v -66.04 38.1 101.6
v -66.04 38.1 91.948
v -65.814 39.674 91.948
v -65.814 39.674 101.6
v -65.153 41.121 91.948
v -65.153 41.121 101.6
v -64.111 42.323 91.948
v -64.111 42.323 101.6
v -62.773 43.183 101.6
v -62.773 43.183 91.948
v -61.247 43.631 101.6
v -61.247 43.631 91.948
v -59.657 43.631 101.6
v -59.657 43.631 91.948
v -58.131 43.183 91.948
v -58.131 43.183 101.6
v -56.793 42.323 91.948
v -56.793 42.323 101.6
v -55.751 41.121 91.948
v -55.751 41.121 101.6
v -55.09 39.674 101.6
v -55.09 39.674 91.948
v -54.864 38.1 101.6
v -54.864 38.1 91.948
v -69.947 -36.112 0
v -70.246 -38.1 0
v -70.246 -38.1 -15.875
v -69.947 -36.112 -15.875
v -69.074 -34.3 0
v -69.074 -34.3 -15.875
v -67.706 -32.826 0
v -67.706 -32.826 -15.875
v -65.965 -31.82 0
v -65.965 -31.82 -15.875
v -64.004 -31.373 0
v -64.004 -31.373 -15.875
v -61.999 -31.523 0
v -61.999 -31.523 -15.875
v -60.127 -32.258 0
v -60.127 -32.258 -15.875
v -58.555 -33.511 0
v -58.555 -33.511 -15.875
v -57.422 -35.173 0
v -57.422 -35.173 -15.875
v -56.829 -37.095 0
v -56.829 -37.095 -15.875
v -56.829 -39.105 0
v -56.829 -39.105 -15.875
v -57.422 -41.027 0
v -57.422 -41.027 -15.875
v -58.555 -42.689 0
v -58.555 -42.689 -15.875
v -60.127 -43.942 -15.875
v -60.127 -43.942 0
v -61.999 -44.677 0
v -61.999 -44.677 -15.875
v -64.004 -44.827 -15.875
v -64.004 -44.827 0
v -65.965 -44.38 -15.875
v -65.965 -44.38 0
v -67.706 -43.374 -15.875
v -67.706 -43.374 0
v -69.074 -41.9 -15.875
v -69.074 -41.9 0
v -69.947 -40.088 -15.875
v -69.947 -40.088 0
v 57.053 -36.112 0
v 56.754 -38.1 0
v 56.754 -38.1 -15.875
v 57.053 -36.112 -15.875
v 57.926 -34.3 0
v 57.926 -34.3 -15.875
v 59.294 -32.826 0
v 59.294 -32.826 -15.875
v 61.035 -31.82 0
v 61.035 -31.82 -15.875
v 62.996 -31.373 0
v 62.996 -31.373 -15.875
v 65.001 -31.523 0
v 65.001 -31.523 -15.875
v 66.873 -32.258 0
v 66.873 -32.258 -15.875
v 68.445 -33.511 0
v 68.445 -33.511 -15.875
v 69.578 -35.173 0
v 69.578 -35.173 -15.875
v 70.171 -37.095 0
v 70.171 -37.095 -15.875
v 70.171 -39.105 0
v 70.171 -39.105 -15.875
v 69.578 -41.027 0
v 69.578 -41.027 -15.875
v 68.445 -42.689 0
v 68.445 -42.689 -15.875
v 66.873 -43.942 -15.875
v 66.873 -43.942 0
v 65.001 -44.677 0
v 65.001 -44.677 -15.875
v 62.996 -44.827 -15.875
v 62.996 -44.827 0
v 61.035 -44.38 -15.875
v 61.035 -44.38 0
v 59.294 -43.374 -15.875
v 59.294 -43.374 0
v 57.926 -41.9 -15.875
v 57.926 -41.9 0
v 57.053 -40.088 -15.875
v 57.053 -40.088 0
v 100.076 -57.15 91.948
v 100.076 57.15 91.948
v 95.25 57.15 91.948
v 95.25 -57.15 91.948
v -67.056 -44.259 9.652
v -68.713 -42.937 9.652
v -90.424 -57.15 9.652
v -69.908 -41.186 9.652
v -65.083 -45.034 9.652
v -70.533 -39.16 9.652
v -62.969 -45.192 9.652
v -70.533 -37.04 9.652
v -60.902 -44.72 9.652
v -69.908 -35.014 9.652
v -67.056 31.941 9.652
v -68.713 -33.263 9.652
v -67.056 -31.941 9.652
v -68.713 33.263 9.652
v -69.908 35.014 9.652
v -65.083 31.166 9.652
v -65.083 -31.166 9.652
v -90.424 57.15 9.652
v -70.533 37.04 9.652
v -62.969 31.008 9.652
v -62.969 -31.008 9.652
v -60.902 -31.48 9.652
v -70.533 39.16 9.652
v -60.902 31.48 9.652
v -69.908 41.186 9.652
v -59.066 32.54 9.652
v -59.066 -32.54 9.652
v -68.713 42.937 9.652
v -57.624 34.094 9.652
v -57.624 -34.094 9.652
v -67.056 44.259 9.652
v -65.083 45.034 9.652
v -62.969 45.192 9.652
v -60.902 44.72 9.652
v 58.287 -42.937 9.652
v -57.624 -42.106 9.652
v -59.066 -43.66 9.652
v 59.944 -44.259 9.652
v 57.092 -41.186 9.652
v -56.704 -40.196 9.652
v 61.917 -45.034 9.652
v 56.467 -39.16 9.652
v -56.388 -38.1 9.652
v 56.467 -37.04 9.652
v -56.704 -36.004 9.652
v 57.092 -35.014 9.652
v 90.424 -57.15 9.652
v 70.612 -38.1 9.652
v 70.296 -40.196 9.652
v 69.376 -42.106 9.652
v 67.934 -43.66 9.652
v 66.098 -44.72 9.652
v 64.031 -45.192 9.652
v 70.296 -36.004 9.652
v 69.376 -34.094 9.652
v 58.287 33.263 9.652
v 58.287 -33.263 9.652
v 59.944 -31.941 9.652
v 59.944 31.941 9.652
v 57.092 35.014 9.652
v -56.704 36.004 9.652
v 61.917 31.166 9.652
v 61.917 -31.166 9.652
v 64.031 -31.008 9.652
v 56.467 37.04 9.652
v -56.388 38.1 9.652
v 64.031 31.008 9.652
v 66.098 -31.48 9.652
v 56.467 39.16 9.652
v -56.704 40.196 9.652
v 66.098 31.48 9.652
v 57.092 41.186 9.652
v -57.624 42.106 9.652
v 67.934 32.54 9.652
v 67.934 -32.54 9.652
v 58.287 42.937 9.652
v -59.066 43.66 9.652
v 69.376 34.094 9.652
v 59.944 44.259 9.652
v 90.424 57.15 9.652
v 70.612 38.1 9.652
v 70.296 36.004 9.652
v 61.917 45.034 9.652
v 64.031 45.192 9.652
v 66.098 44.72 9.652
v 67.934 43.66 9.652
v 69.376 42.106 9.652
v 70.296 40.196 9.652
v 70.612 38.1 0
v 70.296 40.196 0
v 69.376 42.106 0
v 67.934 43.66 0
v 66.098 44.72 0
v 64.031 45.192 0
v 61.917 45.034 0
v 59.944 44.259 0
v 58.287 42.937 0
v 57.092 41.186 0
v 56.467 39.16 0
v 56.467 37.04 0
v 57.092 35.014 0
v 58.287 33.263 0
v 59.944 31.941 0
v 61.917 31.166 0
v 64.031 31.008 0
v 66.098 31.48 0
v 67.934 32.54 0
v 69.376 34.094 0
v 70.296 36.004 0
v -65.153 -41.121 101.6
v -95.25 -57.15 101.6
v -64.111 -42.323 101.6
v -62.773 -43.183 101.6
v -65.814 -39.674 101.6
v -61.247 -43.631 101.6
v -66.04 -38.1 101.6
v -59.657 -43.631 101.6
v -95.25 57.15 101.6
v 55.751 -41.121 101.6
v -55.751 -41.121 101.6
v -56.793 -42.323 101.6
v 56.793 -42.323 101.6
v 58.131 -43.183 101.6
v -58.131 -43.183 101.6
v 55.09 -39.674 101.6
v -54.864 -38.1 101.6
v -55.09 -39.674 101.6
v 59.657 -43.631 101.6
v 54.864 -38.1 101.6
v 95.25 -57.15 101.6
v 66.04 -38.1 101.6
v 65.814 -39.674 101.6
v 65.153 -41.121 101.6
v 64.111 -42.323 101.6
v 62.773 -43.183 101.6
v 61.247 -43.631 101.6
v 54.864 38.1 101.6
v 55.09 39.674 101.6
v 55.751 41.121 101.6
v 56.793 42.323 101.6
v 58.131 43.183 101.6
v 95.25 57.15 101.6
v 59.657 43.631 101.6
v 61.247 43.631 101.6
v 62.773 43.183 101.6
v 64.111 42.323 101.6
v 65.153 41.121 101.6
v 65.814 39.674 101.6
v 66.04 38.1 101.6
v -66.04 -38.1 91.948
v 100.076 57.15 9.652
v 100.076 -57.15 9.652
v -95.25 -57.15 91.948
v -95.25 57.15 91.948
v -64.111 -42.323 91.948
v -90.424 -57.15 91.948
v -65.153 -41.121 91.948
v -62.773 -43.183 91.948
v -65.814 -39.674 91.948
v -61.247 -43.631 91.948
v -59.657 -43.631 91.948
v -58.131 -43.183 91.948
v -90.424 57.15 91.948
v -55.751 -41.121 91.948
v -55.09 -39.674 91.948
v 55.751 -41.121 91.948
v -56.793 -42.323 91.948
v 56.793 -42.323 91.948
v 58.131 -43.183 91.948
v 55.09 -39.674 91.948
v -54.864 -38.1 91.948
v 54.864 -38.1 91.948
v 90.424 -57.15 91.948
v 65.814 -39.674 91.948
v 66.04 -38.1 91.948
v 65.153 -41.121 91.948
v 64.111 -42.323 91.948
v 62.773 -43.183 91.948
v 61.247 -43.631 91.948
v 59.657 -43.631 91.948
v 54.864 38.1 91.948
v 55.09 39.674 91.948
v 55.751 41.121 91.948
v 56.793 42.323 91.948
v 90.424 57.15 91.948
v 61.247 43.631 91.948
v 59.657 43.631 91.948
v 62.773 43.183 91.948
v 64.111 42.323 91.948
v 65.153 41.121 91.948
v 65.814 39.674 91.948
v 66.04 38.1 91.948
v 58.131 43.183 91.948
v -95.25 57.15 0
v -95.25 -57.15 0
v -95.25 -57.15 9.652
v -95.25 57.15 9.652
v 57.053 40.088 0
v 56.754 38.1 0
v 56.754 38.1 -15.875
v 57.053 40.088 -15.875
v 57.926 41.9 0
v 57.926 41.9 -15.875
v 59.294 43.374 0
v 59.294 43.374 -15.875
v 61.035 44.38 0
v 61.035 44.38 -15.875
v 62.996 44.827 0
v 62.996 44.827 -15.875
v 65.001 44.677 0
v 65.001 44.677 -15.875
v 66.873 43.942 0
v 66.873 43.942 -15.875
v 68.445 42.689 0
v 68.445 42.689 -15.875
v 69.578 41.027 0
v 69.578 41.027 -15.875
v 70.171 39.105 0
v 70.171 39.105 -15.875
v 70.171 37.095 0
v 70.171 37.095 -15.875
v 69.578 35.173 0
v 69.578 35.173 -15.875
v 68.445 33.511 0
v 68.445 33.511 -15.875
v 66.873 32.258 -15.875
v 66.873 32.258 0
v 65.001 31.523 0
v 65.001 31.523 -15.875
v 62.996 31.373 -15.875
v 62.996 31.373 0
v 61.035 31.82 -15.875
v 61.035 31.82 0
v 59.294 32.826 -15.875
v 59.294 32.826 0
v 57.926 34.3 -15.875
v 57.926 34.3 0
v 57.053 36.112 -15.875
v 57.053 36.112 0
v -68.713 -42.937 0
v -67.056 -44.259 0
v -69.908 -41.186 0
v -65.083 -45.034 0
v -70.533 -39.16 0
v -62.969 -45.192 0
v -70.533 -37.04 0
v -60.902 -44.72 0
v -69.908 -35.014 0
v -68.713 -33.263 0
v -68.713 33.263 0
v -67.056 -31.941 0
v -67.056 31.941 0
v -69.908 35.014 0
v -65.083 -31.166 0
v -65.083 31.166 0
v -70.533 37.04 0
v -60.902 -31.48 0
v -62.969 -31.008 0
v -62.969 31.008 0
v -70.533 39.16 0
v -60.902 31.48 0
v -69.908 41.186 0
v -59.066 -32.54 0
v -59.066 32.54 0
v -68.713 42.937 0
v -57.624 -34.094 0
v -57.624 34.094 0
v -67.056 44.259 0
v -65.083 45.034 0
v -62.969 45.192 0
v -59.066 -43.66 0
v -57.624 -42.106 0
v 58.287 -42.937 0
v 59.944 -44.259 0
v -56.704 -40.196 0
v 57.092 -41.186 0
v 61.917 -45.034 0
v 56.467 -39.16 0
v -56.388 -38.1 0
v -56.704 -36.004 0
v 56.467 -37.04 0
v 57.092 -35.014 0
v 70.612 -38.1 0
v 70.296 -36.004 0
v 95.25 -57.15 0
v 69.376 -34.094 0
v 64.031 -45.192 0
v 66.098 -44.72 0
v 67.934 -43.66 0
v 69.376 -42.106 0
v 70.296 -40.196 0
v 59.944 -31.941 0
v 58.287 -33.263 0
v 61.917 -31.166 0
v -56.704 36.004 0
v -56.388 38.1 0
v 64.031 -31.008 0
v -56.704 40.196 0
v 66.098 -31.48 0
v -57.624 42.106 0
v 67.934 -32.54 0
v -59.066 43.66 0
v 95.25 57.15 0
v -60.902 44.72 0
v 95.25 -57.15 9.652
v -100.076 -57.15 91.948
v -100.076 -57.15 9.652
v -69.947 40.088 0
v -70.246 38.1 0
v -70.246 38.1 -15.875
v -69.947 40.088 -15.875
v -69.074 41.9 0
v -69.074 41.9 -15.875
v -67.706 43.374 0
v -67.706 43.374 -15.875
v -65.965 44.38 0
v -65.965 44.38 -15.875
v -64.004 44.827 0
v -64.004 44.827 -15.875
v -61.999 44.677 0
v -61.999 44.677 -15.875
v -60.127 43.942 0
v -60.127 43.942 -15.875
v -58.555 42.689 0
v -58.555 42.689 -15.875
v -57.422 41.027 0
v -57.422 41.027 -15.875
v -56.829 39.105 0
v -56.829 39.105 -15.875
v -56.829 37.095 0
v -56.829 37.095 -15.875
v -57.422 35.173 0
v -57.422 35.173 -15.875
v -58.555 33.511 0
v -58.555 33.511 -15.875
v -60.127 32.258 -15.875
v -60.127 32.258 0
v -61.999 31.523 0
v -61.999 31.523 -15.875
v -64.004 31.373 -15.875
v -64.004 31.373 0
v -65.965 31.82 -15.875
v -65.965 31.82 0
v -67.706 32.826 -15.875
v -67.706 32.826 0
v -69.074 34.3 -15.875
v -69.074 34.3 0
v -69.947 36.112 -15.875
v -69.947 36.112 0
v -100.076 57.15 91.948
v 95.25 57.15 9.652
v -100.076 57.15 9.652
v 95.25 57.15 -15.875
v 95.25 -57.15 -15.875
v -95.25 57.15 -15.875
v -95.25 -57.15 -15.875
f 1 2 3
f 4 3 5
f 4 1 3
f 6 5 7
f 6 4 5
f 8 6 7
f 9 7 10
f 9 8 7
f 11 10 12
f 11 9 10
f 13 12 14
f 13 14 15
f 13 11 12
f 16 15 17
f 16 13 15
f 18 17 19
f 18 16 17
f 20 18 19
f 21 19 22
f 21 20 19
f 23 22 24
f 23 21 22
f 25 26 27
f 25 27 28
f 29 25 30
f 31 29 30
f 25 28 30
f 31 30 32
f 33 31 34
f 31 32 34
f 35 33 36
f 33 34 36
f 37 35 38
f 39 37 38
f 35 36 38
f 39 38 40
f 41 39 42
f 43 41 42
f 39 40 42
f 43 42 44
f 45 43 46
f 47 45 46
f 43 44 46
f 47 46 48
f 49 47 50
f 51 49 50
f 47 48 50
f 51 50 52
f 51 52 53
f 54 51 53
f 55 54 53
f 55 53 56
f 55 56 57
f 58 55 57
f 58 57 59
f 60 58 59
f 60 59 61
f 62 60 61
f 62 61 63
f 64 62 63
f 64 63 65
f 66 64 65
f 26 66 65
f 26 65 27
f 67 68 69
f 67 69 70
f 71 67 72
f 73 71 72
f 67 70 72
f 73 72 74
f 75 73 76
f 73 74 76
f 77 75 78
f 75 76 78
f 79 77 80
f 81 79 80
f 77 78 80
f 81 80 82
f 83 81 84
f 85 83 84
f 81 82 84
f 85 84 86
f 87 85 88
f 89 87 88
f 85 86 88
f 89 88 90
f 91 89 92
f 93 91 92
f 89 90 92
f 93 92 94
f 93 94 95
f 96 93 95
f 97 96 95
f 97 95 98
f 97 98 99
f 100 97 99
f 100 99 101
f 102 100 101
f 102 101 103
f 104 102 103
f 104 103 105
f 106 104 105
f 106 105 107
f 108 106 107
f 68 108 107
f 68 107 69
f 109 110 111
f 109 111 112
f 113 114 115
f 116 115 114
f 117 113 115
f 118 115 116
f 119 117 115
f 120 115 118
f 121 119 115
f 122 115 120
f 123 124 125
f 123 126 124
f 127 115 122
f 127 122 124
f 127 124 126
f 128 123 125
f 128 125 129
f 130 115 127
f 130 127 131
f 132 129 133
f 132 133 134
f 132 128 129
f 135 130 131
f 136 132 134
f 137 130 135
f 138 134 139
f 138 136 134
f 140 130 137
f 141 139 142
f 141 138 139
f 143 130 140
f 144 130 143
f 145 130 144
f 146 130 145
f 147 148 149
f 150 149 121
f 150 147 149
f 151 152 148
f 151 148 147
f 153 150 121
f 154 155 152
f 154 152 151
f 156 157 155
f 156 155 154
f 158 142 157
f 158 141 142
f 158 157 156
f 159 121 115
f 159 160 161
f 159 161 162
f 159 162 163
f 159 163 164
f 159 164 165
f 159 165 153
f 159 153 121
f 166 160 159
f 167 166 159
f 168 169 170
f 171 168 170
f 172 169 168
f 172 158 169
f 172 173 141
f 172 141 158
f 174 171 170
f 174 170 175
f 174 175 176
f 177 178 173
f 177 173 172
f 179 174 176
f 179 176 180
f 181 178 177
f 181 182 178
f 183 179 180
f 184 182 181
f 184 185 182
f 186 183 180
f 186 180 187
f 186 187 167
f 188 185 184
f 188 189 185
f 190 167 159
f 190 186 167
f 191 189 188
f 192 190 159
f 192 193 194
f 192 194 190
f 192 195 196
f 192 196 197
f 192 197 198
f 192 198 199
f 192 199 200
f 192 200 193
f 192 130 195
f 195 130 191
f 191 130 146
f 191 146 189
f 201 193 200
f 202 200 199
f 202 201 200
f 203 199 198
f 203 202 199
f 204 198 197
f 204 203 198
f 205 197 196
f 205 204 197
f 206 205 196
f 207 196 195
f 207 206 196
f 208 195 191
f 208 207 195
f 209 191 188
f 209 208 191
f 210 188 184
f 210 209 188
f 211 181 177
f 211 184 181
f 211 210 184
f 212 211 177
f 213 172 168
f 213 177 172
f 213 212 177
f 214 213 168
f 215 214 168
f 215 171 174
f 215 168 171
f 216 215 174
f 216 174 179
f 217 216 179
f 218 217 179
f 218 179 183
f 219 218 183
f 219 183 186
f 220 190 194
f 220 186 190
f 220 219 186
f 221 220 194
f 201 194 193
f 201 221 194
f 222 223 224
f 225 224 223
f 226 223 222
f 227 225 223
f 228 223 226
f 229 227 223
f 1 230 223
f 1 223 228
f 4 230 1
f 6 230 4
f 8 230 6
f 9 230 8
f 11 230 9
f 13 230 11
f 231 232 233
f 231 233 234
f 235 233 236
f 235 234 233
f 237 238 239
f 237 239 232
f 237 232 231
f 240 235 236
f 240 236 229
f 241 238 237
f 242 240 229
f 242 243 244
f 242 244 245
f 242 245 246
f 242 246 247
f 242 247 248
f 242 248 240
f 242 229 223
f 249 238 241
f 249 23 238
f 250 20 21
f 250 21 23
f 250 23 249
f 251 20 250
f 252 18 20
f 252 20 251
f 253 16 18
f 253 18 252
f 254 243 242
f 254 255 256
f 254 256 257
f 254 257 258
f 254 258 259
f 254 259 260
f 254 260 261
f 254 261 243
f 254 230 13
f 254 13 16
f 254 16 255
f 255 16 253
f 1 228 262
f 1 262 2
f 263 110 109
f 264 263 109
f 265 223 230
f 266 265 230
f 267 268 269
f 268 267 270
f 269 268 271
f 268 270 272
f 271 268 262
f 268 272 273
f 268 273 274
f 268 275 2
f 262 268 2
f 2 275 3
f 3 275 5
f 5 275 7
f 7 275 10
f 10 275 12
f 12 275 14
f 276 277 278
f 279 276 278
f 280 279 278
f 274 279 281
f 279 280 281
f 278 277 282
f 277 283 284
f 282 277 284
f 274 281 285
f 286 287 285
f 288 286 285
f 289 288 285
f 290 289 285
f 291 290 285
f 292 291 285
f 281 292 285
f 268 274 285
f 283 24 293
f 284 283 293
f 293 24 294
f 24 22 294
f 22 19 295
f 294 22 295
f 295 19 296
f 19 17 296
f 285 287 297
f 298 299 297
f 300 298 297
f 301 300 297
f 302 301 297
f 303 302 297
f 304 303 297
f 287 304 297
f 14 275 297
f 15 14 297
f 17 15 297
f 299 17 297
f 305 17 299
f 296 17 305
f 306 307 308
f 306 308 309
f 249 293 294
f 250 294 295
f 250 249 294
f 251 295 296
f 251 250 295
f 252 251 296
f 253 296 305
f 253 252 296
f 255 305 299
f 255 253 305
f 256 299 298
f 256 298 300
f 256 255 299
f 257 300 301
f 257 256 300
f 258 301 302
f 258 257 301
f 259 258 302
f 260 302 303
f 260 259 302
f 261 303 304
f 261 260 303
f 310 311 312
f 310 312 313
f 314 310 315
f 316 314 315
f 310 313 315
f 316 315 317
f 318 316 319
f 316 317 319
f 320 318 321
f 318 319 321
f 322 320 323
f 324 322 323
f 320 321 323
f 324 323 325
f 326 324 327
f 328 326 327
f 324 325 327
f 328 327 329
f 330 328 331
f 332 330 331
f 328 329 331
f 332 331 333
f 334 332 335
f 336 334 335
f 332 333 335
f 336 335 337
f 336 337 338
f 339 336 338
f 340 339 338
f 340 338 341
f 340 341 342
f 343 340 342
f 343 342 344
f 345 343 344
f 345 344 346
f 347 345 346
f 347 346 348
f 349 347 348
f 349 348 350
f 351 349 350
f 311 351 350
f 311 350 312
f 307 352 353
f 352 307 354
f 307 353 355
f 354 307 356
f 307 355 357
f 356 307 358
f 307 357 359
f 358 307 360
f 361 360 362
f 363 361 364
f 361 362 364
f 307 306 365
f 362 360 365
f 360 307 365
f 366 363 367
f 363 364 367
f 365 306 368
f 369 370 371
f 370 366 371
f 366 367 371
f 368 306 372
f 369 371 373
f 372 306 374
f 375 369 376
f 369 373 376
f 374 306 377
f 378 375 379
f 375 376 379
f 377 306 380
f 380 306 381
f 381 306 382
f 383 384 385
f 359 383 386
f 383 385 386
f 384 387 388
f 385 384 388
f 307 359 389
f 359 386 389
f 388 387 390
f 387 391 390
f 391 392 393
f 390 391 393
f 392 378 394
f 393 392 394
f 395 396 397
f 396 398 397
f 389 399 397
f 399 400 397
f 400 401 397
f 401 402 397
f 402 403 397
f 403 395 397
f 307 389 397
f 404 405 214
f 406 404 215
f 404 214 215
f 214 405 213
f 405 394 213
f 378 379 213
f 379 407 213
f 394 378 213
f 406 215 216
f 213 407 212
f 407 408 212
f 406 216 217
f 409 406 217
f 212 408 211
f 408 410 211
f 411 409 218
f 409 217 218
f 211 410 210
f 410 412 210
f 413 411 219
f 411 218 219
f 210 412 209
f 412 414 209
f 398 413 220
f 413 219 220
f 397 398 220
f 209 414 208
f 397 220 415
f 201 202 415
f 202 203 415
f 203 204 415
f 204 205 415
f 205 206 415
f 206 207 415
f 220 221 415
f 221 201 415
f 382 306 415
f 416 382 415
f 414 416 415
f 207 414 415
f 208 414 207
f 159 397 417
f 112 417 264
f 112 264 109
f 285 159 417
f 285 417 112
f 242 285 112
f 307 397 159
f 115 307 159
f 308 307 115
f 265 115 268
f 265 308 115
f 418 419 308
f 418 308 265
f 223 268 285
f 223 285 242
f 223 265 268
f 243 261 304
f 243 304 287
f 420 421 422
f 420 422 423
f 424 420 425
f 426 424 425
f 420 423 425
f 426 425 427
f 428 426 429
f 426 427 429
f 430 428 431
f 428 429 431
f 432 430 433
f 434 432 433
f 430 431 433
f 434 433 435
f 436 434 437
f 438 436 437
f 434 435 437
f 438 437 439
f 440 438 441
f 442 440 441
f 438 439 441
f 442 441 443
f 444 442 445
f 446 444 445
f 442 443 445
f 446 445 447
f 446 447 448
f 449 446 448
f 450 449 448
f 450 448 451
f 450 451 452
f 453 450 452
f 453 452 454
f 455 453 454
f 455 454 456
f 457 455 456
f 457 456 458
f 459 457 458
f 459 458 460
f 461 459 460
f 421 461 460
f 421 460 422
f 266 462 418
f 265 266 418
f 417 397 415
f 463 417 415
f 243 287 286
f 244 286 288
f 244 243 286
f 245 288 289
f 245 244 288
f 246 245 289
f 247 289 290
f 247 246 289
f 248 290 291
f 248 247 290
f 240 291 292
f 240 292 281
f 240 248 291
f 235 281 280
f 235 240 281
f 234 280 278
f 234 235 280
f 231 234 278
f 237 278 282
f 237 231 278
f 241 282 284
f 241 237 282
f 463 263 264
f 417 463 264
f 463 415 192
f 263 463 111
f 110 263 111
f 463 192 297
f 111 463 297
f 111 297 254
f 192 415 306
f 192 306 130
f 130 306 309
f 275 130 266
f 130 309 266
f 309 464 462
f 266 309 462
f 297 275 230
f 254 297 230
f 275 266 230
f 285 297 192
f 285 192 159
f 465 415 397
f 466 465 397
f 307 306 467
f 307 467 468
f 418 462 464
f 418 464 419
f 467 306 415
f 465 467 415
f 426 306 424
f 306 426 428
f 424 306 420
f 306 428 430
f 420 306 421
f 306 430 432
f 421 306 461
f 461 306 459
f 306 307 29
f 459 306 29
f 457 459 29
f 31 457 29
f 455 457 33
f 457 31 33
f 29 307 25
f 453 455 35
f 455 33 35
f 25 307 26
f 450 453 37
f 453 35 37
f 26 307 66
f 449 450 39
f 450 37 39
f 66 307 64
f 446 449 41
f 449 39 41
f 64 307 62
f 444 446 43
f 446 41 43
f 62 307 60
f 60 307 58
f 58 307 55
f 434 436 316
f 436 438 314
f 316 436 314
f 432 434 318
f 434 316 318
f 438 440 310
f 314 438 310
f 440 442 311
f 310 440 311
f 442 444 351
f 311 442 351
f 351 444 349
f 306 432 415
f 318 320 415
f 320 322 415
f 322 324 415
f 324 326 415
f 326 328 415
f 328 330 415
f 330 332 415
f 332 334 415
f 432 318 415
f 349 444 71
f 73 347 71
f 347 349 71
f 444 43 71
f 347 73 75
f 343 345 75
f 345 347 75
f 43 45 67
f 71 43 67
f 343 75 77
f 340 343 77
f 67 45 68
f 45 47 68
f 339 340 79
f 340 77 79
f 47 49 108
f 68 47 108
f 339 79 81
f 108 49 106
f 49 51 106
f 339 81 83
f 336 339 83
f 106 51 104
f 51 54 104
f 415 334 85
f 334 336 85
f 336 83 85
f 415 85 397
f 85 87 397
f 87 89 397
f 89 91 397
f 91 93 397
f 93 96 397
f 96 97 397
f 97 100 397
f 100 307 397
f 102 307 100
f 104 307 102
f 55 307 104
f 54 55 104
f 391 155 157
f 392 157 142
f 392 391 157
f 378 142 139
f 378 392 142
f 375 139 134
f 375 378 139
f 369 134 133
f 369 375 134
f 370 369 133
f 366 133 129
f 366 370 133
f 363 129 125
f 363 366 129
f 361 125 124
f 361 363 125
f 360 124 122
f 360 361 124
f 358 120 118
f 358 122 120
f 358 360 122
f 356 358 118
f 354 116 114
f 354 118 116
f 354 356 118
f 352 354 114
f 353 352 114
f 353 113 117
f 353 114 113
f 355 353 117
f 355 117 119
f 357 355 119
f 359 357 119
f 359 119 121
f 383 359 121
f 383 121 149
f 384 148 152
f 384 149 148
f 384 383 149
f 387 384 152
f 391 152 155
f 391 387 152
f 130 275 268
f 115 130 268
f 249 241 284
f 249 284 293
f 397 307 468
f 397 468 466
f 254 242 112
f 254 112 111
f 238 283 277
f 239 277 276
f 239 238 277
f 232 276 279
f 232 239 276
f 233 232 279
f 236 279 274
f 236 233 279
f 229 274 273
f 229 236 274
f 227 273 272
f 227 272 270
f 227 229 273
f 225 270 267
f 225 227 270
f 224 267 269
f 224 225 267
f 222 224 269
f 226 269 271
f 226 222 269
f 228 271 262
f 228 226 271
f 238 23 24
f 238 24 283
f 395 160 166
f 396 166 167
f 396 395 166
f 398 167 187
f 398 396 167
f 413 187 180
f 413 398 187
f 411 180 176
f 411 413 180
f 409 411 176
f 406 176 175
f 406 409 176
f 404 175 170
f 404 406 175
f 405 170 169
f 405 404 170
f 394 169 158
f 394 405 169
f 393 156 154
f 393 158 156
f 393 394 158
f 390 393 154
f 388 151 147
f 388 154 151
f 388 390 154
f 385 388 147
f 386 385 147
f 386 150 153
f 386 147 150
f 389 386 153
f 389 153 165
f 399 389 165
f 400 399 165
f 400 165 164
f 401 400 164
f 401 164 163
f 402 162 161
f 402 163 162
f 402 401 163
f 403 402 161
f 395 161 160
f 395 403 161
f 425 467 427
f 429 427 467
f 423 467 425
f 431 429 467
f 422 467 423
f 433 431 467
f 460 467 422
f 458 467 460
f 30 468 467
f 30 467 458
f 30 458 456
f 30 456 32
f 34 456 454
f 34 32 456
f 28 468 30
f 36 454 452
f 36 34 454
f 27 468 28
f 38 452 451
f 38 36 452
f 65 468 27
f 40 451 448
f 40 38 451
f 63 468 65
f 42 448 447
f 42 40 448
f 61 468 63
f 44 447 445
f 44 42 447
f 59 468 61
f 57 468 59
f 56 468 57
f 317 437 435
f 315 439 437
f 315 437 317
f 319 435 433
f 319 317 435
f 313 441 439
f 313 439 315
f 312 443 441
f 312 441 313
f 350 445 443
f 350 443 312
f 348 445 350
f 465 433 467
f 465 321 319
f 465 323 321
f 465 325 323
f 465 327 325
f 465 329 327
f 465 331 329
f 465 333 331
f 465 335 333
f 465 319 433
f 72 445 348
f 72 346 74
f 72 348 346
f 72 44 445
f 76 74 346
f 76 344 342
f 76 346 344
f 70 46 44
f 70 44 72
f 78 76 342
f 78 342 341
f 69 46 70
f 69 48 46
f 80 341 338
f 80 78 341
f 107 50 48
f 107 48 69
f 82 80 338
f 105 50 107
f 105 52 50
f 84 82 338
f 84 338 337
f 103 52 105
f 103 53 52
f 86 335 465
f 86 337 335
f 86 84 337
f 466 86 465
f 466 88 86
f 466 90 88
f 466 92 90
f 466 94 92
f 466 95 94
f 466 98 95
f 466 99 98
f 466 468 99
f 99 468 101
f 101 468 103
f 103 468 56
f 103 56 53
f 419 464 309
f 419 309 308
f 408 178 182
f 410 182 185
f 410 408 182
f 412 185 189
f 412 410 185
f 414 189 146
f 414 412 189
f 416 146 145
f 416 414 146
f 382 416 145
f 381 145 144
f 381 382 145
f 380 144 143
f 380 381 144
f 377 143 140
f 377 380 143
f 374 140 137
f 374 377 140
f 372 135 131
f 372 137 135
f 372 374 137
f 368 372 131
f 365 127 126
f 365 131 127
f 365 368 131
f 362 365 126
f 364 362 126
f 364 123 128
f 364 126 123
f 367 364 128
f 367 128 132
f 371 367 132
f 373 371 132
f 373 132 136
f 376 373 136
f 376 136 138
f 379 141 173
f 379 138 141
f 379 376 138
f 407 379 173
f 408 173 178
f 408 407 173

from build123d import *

# Parameters (mm, degrees)
F0_W     = 190.5
F0_H     = 114.3
F0_R     = 7.112
F1_DEPTH = 9.652
F3_W     = 190.5
F3_H     = 114.3
F4_DEPTH = 9.652
F5_W     = 114.3
F5_H     = 82.296
F6_DEPTH = 4.826
F8_W     = 190.5
F8_H     = 114.3
F9_DEPTH = 15.875
F10_D    = 13.49248


with BuildPart() as f1:
    # F0 (on Top) → F1 (new body)
    with BuildSketch(Plane.XY):
        Rectangle(F0_W, F0_H)
        with Locations((-63.5, -38.1)):
            Circle(F0_R, mode=Mode.SUBTRACT)
        with Locations((63.5, -38.1)):
            Circle(F0_R, mode=Mode.SUBTRACT)
        with Locations((-63.5, 38.1)):
            Circle(F0_R, mode=Mode.SUBTRACT)
        with Locations((63.5, 38.1)):
            Circle(F0_R, mode=Mode.SUBTRACT)
    extrude(amount=F1_DEPTH)



with BuildPart() as f4:
    # F3 (on offset) → F4 (new body)
    with BuildSketch(Plane.XY.offset(101.6)):
        Rectangle(F3_W, F3_H)
        with BuildLine():
            Line((-66.04, -38.1), (-66.04, 38.1))
            ThreePointArc((-66.04, 38.1), (-60.452, 43.688), (-54.864, 38.1))
            Line((-54.864, 38.1), (-54.864, -38.1))
            ThreePointArc((-54.864, -38.1), (-60.452, -43.688), (-66.04, -38.1))
        make_face(mode=Mode.SUBTRACT)
        with BuildLine():
            ThreePointArc((54.864, 38.1), (60.452, 43.688), (66.04, 38.1))
            Line((66.04, 38.1), (66.04, -38.1))
            ThreePointArc((66.04, -38.1), (60.452, -43.688), (54.864, -38.1))
            Line((54.864, -38.1), (54.864, 38.1))
        make_face(mode=Mode.SUBTRACT)
    extrude(amount=-F4_DEPTH)


with BuildPart() as f1_1:
    add(f1.part)

    add(f4.part)  # F6 merges F4
    # F5 (on face) → F6 (join, symmetric)
    with BuildSketch(Plane(origin=(-95.25, 0, 0), x_dir=(0, -1, 0), z_dir=(-1, 0, 0))):
        with Locations((0, 50.8)):
            Rectangle(F5_W, F5_H)
    extrude(amount=F6_DEPTH, both=True)

    # F7: F1 across plane


with BuildPart() as f1_2:
    add(f1_1.part)
    add(f1_1.part.mirror(Plane.YZ))


with BuildPart() as f9:
    # F8 (on face) → F9 (new body)
    with BuildSketch(Plane(origin=(0, 0, 0), x_dir=(1, 0, 0), z_dir=(0, 0, -1))):
        Rectangle(F8_W, F8_H)
    extrude(amount=F9_DEPTH)

    # F10 (through all)
    with Locations(Plane.XY):
        with Locations((-63.5, 38.1), (63.5, 38.1), (63.5, -38.1), (-63.5, -38.1)):
            Hole(F10_D / 2)


solid = Compound([f1_2.part, f9.part])
